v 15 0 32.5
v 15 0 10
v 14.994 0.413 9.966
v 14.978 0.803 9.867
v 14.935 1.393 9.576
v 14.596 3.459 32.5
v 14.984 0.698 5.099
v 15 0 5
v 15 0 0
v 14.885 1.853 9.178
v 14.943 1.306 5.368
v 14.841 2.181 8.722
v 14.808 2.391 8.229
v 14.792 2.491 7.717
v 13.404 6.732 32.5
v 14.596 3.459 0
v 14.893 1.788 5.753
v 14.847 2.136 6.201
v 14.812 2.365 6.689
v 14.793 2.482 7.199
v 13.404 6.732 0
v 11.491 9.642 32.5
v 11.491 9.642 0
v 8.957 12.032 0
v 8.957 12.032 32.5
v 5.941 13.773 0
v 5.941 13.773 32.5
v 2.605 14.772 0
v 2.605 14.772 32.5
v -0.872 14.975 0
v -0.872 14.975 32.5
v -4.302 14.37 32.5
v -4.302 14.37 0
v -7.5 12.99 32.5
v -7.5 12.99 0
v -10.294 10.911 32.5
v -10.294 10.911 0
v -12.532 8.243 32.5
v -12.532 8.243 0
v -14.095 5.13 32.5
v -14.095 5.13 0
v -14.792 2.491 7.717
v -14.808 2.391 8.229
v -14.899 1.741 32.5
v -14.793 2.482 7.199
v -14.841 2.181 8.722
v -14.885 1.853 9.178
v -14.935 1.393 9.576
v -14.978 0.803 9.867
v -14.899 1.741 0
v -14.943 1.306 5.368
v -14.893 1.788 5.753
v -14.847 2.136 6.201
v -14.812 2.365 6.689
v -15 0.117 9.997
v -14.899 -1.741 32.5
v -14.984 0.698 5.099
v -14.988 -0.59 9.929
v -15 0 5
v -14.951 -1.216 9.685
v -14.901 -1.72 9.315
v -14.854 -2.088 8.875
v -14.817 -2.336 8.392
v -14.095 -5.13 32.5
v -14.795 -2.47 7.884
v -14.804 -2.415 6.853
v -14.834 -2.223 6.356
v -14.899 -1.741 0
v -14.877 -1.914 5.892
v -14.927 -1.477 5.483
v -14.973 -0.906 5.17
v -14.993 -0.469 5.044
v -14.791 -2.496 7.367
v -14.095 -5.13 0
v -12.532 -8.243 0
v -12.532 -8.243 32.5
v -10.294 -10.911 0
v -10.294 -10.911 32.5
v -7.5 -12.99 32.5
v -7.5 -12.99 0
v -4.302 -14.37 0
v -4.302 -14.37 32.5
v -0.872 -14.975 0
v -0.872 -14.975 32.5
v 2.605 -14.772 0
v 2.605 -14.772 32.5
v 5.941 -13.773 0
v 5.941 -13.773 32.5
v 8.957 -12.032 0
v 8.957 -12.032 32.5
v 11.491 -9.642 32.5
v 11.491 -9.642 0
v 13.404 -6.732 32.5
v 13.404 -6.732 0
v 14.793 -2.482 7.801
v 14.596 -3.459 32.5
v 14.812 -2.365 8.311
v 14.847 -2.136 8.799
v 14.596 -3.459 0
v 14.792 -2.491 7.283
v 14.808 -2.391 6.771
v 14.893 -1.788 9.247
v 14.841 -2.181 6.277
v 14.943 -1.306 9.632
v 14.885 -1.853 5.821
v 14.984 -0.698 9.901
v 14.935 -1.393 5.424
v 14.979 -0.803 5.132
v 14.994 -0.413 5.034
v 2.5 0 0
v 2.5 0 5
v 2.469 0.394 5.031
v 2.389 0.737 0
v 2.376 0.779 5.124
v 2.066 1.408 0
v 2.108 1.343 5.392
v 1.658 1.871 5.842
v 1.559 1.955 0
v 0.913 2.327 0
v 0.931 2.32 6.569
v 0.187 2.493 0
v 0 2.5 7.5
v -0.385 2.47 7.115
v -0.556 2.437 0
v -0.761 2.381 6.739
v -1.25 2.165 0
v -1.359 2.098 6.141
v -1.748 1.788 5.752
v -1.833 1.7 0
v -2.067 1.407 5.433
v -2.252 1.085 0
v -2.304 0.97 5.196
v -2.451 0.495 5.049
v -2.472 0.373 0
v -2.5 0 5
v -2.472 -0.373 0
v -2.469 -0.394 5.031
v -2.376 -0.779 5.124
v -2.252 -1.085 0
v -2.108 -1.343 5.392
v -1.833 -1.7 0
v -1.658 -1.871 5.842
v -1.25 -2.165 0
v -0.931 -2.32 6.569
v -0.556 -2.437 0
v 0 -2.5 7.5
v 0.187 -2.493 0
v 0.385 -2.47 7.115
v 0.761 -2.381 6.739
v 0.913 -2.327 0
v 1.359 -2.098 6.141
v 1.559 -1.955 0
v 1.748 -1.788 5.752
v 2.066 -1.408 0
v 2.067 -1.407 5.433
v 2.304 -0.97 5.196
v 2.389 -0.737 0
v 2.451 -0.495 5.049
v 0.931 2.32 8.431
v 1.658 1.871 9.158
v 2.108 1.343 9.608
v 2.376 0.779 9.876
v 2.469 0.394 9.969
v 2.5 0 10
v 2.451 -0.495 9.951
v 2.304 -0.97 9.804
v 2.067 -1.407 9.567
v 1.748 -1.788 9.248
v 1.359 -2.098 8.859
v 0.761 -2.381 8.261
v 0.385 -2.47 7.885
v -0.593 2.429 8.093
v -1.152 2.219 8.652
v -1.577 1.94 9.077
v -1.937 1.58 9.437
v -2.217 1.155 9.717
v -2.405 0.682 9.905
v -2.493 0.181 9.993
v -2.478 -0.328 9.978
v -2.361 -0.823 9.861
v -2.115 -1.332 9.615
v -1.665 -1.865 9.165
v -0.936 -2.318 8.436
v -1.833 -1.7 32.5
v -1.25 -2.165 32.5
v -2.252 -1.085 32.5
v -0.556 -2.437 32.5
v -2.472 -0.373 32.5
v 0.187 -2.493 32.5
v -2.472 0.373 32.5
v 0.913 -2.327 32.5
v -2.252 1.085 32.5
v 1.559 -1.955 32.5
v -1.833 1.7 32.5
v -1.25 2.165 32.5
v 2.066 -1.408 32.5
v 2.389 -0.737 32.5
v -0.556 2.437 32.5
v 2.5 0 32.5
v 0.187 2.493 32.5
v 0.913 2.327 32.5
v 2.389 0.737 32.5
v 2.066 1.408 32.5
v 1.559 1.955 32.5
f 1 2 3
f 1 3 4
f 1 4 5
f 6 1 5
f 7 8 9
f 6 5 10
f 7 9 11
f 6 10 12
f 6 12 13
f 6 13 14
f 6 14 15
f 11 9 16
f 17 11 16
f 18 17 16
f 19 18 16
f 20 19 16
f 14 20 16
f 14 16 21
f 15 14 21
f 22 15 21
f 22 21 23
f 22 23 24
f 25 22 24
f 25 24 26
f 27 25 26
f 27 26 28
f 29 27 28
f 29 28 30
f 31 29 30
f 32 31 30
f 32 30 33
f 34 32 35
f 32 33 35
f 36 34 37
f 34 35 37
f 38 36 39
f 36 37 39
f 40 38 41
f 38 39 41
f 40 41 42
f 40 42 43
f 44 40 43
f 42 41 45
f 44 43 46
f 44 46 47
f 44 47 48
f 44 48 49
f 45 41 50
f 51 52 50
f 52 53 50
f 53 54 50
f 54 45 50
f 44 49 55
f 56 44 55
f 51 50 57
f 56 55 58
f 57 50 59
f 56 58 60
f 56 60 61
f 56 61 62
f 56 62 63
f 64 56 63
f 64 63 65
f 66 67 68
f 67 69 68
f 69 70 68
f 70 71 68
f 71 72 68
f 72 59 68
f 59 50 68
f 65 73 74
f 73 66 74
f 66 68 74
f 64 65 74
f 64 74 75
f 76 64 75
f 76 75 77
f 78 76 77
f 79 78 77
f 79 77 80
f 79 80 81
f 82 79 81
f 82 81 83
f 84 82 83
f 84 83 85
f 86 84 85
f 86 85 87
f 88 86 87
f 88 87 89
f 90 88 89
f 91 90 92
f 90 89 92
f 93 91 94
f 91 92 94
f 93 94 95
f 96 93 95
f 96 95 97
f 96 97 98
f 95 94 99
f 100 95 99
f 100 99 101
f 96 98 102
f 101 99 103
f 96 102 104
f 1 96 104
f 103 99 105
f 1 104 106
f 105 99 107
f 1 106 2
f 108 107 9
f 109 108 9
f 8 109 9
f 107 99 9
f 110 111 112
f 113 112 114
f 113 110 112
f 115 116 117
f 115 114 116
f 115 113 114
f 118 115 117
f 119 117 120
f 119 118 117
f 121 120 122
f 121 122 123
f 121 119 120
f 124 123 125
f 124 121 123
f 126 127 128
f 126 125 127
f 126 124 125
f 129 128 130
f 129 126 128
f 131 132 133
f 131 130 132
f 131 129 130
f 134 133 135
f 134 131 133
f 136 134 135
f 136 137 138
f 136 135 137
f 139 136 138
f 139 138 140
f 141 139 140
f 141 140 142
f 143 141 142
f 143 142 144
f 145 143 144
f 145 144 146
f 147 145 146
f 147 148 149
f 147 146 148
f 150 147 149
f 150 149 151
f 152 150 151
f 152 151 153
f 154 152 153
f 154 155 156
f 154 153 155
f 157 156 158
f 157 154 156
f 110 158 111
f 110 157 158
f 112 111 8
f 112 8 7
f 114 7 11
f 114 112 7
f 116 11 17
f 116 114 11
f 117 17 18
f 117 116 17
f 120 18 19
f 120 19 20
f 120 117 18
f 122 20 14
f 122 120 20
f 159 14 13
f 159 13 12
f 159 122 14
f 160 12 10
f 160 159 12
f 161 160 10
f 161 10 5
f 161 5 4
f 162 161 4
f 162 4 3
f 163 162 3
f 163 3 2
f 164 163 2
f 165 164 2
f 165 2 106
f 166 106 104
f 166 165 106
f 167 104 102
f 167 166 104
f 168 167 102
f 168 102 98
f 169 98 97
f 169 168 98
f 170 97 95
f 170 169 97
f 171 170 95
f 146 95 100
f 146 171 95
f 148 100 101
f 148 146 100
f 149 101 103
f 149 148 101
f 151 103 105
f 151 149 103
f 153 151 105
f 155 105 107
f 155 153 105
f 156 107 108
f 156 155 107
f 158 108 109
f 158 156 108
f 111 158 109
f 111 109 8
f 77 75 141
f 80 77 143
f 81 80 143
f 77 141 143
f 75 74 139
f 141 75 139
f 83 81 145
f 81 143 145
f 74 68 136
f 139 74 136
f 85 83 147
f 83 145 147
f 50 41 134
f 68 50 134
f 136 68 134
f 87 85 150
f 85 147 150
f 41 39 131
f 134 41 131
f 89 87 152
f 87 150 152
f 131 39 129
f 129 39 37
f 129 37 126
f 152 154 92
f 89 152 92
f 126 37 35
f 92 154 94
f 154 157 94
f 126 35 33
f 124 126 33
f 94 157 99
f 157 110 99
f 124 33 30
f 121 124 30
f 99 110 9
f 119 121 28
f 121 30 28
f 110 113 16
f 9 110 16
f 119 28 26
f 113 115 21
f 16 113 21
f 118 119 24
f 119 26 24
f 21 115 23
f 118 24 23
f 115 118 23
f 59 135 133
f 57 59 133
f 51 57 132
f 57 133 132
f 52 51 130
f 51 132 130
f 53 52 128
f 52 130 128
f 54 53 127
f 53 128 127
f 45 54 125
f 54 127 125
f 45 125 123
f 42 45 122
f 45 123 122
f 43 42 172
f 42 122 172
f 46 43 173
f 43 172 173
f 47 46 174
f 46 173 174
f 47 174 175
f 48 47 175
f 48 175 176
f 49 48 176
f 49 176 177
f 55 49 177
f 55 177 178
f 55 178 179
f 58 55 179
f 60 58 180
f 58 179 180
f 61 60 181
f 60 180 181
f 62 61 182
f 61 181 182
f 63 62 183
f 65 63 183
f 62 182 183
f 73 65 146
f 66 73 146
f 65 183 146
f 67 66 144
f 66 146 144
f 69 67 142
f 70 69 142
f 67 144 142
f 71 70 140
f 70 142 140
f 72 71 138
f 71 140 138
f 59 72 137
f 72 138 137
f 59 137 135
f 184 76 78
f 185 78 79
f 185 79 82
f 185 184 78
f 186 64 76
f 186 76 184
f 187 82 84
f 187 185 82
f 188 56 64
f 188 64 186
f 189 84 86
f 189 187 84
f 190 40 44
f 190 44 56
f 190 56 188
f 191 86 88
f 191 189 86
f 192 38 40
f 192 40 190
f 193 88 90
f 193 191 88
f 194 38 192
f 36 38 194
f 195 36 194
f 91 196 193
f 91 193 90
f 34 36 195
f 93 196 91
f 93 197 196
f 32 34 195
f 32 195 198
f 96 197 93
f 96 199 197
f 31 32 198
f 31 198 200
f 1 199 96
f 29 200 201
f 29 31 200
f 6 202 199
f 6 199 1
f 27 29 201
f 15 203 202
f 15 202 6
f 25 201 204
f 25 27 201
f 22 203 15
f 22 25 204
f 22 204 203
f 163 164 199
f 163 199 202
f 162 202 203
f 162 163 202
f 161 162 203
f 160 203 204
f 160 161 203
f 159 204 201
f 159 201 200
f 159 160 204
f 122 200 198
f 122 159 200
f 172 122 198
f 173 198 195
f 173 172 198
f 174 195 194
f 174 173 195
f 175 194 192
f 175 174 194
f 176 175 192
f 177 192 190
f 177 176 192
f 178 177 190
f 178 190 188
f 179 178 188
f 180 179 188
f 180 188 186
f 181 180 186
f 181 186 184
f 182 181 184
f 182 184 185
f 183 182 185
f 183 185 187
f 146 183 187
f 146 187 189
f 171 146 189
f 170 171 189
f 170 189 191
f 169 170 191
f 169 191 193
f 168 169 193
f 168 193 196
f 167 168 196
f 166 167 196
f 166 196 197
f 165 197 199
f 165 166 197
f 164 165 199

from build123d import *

# Parameters (mm, degrees)
SKETCH1_R               = 15
SKETCH1_R_2             = 2.5
BOSS_EXTRUDE1_DEPTH     = 32.5
CUT_EXTRUDE1_DEPTH      = 32.5
CUT_EXTRUDE1_DEPTH_BACK = 32.5
SKETCH2_R               = 2.5


with BuildPart() as part:
    # Sketch1 → Boss-Extrude1 (new body)
    with BuildSketch(Plane.XY):
        Circle(SKETCH1_R)
        Circle(SKETCH1_R_2, mode=Mode.SUBTRACT)
    extrude(amount=BOSS_EXTRUDE1_DEPTH)

    # Sketch2 → Cut-Extrude1 (cut, two sides: drawn at the far end of the back side and taken through both)
    with BuildSketch(Plane(origin=(0, 0, 0), x_dir=(0, 0, -1), z_dir=(1, 0, 0)).offset(-CUT_EXTRUDE1_DEPTH_BACK)):
        with Locations((-7.5, 0)):
            Circle(SKETCH2_R)
    extrude(amount=CUT_EXTRUDE1_DEPTH + CUT_EXTRUDE1_DEPTH_BACK, mode=Mode.SUBTRACT)


solid = part.part
